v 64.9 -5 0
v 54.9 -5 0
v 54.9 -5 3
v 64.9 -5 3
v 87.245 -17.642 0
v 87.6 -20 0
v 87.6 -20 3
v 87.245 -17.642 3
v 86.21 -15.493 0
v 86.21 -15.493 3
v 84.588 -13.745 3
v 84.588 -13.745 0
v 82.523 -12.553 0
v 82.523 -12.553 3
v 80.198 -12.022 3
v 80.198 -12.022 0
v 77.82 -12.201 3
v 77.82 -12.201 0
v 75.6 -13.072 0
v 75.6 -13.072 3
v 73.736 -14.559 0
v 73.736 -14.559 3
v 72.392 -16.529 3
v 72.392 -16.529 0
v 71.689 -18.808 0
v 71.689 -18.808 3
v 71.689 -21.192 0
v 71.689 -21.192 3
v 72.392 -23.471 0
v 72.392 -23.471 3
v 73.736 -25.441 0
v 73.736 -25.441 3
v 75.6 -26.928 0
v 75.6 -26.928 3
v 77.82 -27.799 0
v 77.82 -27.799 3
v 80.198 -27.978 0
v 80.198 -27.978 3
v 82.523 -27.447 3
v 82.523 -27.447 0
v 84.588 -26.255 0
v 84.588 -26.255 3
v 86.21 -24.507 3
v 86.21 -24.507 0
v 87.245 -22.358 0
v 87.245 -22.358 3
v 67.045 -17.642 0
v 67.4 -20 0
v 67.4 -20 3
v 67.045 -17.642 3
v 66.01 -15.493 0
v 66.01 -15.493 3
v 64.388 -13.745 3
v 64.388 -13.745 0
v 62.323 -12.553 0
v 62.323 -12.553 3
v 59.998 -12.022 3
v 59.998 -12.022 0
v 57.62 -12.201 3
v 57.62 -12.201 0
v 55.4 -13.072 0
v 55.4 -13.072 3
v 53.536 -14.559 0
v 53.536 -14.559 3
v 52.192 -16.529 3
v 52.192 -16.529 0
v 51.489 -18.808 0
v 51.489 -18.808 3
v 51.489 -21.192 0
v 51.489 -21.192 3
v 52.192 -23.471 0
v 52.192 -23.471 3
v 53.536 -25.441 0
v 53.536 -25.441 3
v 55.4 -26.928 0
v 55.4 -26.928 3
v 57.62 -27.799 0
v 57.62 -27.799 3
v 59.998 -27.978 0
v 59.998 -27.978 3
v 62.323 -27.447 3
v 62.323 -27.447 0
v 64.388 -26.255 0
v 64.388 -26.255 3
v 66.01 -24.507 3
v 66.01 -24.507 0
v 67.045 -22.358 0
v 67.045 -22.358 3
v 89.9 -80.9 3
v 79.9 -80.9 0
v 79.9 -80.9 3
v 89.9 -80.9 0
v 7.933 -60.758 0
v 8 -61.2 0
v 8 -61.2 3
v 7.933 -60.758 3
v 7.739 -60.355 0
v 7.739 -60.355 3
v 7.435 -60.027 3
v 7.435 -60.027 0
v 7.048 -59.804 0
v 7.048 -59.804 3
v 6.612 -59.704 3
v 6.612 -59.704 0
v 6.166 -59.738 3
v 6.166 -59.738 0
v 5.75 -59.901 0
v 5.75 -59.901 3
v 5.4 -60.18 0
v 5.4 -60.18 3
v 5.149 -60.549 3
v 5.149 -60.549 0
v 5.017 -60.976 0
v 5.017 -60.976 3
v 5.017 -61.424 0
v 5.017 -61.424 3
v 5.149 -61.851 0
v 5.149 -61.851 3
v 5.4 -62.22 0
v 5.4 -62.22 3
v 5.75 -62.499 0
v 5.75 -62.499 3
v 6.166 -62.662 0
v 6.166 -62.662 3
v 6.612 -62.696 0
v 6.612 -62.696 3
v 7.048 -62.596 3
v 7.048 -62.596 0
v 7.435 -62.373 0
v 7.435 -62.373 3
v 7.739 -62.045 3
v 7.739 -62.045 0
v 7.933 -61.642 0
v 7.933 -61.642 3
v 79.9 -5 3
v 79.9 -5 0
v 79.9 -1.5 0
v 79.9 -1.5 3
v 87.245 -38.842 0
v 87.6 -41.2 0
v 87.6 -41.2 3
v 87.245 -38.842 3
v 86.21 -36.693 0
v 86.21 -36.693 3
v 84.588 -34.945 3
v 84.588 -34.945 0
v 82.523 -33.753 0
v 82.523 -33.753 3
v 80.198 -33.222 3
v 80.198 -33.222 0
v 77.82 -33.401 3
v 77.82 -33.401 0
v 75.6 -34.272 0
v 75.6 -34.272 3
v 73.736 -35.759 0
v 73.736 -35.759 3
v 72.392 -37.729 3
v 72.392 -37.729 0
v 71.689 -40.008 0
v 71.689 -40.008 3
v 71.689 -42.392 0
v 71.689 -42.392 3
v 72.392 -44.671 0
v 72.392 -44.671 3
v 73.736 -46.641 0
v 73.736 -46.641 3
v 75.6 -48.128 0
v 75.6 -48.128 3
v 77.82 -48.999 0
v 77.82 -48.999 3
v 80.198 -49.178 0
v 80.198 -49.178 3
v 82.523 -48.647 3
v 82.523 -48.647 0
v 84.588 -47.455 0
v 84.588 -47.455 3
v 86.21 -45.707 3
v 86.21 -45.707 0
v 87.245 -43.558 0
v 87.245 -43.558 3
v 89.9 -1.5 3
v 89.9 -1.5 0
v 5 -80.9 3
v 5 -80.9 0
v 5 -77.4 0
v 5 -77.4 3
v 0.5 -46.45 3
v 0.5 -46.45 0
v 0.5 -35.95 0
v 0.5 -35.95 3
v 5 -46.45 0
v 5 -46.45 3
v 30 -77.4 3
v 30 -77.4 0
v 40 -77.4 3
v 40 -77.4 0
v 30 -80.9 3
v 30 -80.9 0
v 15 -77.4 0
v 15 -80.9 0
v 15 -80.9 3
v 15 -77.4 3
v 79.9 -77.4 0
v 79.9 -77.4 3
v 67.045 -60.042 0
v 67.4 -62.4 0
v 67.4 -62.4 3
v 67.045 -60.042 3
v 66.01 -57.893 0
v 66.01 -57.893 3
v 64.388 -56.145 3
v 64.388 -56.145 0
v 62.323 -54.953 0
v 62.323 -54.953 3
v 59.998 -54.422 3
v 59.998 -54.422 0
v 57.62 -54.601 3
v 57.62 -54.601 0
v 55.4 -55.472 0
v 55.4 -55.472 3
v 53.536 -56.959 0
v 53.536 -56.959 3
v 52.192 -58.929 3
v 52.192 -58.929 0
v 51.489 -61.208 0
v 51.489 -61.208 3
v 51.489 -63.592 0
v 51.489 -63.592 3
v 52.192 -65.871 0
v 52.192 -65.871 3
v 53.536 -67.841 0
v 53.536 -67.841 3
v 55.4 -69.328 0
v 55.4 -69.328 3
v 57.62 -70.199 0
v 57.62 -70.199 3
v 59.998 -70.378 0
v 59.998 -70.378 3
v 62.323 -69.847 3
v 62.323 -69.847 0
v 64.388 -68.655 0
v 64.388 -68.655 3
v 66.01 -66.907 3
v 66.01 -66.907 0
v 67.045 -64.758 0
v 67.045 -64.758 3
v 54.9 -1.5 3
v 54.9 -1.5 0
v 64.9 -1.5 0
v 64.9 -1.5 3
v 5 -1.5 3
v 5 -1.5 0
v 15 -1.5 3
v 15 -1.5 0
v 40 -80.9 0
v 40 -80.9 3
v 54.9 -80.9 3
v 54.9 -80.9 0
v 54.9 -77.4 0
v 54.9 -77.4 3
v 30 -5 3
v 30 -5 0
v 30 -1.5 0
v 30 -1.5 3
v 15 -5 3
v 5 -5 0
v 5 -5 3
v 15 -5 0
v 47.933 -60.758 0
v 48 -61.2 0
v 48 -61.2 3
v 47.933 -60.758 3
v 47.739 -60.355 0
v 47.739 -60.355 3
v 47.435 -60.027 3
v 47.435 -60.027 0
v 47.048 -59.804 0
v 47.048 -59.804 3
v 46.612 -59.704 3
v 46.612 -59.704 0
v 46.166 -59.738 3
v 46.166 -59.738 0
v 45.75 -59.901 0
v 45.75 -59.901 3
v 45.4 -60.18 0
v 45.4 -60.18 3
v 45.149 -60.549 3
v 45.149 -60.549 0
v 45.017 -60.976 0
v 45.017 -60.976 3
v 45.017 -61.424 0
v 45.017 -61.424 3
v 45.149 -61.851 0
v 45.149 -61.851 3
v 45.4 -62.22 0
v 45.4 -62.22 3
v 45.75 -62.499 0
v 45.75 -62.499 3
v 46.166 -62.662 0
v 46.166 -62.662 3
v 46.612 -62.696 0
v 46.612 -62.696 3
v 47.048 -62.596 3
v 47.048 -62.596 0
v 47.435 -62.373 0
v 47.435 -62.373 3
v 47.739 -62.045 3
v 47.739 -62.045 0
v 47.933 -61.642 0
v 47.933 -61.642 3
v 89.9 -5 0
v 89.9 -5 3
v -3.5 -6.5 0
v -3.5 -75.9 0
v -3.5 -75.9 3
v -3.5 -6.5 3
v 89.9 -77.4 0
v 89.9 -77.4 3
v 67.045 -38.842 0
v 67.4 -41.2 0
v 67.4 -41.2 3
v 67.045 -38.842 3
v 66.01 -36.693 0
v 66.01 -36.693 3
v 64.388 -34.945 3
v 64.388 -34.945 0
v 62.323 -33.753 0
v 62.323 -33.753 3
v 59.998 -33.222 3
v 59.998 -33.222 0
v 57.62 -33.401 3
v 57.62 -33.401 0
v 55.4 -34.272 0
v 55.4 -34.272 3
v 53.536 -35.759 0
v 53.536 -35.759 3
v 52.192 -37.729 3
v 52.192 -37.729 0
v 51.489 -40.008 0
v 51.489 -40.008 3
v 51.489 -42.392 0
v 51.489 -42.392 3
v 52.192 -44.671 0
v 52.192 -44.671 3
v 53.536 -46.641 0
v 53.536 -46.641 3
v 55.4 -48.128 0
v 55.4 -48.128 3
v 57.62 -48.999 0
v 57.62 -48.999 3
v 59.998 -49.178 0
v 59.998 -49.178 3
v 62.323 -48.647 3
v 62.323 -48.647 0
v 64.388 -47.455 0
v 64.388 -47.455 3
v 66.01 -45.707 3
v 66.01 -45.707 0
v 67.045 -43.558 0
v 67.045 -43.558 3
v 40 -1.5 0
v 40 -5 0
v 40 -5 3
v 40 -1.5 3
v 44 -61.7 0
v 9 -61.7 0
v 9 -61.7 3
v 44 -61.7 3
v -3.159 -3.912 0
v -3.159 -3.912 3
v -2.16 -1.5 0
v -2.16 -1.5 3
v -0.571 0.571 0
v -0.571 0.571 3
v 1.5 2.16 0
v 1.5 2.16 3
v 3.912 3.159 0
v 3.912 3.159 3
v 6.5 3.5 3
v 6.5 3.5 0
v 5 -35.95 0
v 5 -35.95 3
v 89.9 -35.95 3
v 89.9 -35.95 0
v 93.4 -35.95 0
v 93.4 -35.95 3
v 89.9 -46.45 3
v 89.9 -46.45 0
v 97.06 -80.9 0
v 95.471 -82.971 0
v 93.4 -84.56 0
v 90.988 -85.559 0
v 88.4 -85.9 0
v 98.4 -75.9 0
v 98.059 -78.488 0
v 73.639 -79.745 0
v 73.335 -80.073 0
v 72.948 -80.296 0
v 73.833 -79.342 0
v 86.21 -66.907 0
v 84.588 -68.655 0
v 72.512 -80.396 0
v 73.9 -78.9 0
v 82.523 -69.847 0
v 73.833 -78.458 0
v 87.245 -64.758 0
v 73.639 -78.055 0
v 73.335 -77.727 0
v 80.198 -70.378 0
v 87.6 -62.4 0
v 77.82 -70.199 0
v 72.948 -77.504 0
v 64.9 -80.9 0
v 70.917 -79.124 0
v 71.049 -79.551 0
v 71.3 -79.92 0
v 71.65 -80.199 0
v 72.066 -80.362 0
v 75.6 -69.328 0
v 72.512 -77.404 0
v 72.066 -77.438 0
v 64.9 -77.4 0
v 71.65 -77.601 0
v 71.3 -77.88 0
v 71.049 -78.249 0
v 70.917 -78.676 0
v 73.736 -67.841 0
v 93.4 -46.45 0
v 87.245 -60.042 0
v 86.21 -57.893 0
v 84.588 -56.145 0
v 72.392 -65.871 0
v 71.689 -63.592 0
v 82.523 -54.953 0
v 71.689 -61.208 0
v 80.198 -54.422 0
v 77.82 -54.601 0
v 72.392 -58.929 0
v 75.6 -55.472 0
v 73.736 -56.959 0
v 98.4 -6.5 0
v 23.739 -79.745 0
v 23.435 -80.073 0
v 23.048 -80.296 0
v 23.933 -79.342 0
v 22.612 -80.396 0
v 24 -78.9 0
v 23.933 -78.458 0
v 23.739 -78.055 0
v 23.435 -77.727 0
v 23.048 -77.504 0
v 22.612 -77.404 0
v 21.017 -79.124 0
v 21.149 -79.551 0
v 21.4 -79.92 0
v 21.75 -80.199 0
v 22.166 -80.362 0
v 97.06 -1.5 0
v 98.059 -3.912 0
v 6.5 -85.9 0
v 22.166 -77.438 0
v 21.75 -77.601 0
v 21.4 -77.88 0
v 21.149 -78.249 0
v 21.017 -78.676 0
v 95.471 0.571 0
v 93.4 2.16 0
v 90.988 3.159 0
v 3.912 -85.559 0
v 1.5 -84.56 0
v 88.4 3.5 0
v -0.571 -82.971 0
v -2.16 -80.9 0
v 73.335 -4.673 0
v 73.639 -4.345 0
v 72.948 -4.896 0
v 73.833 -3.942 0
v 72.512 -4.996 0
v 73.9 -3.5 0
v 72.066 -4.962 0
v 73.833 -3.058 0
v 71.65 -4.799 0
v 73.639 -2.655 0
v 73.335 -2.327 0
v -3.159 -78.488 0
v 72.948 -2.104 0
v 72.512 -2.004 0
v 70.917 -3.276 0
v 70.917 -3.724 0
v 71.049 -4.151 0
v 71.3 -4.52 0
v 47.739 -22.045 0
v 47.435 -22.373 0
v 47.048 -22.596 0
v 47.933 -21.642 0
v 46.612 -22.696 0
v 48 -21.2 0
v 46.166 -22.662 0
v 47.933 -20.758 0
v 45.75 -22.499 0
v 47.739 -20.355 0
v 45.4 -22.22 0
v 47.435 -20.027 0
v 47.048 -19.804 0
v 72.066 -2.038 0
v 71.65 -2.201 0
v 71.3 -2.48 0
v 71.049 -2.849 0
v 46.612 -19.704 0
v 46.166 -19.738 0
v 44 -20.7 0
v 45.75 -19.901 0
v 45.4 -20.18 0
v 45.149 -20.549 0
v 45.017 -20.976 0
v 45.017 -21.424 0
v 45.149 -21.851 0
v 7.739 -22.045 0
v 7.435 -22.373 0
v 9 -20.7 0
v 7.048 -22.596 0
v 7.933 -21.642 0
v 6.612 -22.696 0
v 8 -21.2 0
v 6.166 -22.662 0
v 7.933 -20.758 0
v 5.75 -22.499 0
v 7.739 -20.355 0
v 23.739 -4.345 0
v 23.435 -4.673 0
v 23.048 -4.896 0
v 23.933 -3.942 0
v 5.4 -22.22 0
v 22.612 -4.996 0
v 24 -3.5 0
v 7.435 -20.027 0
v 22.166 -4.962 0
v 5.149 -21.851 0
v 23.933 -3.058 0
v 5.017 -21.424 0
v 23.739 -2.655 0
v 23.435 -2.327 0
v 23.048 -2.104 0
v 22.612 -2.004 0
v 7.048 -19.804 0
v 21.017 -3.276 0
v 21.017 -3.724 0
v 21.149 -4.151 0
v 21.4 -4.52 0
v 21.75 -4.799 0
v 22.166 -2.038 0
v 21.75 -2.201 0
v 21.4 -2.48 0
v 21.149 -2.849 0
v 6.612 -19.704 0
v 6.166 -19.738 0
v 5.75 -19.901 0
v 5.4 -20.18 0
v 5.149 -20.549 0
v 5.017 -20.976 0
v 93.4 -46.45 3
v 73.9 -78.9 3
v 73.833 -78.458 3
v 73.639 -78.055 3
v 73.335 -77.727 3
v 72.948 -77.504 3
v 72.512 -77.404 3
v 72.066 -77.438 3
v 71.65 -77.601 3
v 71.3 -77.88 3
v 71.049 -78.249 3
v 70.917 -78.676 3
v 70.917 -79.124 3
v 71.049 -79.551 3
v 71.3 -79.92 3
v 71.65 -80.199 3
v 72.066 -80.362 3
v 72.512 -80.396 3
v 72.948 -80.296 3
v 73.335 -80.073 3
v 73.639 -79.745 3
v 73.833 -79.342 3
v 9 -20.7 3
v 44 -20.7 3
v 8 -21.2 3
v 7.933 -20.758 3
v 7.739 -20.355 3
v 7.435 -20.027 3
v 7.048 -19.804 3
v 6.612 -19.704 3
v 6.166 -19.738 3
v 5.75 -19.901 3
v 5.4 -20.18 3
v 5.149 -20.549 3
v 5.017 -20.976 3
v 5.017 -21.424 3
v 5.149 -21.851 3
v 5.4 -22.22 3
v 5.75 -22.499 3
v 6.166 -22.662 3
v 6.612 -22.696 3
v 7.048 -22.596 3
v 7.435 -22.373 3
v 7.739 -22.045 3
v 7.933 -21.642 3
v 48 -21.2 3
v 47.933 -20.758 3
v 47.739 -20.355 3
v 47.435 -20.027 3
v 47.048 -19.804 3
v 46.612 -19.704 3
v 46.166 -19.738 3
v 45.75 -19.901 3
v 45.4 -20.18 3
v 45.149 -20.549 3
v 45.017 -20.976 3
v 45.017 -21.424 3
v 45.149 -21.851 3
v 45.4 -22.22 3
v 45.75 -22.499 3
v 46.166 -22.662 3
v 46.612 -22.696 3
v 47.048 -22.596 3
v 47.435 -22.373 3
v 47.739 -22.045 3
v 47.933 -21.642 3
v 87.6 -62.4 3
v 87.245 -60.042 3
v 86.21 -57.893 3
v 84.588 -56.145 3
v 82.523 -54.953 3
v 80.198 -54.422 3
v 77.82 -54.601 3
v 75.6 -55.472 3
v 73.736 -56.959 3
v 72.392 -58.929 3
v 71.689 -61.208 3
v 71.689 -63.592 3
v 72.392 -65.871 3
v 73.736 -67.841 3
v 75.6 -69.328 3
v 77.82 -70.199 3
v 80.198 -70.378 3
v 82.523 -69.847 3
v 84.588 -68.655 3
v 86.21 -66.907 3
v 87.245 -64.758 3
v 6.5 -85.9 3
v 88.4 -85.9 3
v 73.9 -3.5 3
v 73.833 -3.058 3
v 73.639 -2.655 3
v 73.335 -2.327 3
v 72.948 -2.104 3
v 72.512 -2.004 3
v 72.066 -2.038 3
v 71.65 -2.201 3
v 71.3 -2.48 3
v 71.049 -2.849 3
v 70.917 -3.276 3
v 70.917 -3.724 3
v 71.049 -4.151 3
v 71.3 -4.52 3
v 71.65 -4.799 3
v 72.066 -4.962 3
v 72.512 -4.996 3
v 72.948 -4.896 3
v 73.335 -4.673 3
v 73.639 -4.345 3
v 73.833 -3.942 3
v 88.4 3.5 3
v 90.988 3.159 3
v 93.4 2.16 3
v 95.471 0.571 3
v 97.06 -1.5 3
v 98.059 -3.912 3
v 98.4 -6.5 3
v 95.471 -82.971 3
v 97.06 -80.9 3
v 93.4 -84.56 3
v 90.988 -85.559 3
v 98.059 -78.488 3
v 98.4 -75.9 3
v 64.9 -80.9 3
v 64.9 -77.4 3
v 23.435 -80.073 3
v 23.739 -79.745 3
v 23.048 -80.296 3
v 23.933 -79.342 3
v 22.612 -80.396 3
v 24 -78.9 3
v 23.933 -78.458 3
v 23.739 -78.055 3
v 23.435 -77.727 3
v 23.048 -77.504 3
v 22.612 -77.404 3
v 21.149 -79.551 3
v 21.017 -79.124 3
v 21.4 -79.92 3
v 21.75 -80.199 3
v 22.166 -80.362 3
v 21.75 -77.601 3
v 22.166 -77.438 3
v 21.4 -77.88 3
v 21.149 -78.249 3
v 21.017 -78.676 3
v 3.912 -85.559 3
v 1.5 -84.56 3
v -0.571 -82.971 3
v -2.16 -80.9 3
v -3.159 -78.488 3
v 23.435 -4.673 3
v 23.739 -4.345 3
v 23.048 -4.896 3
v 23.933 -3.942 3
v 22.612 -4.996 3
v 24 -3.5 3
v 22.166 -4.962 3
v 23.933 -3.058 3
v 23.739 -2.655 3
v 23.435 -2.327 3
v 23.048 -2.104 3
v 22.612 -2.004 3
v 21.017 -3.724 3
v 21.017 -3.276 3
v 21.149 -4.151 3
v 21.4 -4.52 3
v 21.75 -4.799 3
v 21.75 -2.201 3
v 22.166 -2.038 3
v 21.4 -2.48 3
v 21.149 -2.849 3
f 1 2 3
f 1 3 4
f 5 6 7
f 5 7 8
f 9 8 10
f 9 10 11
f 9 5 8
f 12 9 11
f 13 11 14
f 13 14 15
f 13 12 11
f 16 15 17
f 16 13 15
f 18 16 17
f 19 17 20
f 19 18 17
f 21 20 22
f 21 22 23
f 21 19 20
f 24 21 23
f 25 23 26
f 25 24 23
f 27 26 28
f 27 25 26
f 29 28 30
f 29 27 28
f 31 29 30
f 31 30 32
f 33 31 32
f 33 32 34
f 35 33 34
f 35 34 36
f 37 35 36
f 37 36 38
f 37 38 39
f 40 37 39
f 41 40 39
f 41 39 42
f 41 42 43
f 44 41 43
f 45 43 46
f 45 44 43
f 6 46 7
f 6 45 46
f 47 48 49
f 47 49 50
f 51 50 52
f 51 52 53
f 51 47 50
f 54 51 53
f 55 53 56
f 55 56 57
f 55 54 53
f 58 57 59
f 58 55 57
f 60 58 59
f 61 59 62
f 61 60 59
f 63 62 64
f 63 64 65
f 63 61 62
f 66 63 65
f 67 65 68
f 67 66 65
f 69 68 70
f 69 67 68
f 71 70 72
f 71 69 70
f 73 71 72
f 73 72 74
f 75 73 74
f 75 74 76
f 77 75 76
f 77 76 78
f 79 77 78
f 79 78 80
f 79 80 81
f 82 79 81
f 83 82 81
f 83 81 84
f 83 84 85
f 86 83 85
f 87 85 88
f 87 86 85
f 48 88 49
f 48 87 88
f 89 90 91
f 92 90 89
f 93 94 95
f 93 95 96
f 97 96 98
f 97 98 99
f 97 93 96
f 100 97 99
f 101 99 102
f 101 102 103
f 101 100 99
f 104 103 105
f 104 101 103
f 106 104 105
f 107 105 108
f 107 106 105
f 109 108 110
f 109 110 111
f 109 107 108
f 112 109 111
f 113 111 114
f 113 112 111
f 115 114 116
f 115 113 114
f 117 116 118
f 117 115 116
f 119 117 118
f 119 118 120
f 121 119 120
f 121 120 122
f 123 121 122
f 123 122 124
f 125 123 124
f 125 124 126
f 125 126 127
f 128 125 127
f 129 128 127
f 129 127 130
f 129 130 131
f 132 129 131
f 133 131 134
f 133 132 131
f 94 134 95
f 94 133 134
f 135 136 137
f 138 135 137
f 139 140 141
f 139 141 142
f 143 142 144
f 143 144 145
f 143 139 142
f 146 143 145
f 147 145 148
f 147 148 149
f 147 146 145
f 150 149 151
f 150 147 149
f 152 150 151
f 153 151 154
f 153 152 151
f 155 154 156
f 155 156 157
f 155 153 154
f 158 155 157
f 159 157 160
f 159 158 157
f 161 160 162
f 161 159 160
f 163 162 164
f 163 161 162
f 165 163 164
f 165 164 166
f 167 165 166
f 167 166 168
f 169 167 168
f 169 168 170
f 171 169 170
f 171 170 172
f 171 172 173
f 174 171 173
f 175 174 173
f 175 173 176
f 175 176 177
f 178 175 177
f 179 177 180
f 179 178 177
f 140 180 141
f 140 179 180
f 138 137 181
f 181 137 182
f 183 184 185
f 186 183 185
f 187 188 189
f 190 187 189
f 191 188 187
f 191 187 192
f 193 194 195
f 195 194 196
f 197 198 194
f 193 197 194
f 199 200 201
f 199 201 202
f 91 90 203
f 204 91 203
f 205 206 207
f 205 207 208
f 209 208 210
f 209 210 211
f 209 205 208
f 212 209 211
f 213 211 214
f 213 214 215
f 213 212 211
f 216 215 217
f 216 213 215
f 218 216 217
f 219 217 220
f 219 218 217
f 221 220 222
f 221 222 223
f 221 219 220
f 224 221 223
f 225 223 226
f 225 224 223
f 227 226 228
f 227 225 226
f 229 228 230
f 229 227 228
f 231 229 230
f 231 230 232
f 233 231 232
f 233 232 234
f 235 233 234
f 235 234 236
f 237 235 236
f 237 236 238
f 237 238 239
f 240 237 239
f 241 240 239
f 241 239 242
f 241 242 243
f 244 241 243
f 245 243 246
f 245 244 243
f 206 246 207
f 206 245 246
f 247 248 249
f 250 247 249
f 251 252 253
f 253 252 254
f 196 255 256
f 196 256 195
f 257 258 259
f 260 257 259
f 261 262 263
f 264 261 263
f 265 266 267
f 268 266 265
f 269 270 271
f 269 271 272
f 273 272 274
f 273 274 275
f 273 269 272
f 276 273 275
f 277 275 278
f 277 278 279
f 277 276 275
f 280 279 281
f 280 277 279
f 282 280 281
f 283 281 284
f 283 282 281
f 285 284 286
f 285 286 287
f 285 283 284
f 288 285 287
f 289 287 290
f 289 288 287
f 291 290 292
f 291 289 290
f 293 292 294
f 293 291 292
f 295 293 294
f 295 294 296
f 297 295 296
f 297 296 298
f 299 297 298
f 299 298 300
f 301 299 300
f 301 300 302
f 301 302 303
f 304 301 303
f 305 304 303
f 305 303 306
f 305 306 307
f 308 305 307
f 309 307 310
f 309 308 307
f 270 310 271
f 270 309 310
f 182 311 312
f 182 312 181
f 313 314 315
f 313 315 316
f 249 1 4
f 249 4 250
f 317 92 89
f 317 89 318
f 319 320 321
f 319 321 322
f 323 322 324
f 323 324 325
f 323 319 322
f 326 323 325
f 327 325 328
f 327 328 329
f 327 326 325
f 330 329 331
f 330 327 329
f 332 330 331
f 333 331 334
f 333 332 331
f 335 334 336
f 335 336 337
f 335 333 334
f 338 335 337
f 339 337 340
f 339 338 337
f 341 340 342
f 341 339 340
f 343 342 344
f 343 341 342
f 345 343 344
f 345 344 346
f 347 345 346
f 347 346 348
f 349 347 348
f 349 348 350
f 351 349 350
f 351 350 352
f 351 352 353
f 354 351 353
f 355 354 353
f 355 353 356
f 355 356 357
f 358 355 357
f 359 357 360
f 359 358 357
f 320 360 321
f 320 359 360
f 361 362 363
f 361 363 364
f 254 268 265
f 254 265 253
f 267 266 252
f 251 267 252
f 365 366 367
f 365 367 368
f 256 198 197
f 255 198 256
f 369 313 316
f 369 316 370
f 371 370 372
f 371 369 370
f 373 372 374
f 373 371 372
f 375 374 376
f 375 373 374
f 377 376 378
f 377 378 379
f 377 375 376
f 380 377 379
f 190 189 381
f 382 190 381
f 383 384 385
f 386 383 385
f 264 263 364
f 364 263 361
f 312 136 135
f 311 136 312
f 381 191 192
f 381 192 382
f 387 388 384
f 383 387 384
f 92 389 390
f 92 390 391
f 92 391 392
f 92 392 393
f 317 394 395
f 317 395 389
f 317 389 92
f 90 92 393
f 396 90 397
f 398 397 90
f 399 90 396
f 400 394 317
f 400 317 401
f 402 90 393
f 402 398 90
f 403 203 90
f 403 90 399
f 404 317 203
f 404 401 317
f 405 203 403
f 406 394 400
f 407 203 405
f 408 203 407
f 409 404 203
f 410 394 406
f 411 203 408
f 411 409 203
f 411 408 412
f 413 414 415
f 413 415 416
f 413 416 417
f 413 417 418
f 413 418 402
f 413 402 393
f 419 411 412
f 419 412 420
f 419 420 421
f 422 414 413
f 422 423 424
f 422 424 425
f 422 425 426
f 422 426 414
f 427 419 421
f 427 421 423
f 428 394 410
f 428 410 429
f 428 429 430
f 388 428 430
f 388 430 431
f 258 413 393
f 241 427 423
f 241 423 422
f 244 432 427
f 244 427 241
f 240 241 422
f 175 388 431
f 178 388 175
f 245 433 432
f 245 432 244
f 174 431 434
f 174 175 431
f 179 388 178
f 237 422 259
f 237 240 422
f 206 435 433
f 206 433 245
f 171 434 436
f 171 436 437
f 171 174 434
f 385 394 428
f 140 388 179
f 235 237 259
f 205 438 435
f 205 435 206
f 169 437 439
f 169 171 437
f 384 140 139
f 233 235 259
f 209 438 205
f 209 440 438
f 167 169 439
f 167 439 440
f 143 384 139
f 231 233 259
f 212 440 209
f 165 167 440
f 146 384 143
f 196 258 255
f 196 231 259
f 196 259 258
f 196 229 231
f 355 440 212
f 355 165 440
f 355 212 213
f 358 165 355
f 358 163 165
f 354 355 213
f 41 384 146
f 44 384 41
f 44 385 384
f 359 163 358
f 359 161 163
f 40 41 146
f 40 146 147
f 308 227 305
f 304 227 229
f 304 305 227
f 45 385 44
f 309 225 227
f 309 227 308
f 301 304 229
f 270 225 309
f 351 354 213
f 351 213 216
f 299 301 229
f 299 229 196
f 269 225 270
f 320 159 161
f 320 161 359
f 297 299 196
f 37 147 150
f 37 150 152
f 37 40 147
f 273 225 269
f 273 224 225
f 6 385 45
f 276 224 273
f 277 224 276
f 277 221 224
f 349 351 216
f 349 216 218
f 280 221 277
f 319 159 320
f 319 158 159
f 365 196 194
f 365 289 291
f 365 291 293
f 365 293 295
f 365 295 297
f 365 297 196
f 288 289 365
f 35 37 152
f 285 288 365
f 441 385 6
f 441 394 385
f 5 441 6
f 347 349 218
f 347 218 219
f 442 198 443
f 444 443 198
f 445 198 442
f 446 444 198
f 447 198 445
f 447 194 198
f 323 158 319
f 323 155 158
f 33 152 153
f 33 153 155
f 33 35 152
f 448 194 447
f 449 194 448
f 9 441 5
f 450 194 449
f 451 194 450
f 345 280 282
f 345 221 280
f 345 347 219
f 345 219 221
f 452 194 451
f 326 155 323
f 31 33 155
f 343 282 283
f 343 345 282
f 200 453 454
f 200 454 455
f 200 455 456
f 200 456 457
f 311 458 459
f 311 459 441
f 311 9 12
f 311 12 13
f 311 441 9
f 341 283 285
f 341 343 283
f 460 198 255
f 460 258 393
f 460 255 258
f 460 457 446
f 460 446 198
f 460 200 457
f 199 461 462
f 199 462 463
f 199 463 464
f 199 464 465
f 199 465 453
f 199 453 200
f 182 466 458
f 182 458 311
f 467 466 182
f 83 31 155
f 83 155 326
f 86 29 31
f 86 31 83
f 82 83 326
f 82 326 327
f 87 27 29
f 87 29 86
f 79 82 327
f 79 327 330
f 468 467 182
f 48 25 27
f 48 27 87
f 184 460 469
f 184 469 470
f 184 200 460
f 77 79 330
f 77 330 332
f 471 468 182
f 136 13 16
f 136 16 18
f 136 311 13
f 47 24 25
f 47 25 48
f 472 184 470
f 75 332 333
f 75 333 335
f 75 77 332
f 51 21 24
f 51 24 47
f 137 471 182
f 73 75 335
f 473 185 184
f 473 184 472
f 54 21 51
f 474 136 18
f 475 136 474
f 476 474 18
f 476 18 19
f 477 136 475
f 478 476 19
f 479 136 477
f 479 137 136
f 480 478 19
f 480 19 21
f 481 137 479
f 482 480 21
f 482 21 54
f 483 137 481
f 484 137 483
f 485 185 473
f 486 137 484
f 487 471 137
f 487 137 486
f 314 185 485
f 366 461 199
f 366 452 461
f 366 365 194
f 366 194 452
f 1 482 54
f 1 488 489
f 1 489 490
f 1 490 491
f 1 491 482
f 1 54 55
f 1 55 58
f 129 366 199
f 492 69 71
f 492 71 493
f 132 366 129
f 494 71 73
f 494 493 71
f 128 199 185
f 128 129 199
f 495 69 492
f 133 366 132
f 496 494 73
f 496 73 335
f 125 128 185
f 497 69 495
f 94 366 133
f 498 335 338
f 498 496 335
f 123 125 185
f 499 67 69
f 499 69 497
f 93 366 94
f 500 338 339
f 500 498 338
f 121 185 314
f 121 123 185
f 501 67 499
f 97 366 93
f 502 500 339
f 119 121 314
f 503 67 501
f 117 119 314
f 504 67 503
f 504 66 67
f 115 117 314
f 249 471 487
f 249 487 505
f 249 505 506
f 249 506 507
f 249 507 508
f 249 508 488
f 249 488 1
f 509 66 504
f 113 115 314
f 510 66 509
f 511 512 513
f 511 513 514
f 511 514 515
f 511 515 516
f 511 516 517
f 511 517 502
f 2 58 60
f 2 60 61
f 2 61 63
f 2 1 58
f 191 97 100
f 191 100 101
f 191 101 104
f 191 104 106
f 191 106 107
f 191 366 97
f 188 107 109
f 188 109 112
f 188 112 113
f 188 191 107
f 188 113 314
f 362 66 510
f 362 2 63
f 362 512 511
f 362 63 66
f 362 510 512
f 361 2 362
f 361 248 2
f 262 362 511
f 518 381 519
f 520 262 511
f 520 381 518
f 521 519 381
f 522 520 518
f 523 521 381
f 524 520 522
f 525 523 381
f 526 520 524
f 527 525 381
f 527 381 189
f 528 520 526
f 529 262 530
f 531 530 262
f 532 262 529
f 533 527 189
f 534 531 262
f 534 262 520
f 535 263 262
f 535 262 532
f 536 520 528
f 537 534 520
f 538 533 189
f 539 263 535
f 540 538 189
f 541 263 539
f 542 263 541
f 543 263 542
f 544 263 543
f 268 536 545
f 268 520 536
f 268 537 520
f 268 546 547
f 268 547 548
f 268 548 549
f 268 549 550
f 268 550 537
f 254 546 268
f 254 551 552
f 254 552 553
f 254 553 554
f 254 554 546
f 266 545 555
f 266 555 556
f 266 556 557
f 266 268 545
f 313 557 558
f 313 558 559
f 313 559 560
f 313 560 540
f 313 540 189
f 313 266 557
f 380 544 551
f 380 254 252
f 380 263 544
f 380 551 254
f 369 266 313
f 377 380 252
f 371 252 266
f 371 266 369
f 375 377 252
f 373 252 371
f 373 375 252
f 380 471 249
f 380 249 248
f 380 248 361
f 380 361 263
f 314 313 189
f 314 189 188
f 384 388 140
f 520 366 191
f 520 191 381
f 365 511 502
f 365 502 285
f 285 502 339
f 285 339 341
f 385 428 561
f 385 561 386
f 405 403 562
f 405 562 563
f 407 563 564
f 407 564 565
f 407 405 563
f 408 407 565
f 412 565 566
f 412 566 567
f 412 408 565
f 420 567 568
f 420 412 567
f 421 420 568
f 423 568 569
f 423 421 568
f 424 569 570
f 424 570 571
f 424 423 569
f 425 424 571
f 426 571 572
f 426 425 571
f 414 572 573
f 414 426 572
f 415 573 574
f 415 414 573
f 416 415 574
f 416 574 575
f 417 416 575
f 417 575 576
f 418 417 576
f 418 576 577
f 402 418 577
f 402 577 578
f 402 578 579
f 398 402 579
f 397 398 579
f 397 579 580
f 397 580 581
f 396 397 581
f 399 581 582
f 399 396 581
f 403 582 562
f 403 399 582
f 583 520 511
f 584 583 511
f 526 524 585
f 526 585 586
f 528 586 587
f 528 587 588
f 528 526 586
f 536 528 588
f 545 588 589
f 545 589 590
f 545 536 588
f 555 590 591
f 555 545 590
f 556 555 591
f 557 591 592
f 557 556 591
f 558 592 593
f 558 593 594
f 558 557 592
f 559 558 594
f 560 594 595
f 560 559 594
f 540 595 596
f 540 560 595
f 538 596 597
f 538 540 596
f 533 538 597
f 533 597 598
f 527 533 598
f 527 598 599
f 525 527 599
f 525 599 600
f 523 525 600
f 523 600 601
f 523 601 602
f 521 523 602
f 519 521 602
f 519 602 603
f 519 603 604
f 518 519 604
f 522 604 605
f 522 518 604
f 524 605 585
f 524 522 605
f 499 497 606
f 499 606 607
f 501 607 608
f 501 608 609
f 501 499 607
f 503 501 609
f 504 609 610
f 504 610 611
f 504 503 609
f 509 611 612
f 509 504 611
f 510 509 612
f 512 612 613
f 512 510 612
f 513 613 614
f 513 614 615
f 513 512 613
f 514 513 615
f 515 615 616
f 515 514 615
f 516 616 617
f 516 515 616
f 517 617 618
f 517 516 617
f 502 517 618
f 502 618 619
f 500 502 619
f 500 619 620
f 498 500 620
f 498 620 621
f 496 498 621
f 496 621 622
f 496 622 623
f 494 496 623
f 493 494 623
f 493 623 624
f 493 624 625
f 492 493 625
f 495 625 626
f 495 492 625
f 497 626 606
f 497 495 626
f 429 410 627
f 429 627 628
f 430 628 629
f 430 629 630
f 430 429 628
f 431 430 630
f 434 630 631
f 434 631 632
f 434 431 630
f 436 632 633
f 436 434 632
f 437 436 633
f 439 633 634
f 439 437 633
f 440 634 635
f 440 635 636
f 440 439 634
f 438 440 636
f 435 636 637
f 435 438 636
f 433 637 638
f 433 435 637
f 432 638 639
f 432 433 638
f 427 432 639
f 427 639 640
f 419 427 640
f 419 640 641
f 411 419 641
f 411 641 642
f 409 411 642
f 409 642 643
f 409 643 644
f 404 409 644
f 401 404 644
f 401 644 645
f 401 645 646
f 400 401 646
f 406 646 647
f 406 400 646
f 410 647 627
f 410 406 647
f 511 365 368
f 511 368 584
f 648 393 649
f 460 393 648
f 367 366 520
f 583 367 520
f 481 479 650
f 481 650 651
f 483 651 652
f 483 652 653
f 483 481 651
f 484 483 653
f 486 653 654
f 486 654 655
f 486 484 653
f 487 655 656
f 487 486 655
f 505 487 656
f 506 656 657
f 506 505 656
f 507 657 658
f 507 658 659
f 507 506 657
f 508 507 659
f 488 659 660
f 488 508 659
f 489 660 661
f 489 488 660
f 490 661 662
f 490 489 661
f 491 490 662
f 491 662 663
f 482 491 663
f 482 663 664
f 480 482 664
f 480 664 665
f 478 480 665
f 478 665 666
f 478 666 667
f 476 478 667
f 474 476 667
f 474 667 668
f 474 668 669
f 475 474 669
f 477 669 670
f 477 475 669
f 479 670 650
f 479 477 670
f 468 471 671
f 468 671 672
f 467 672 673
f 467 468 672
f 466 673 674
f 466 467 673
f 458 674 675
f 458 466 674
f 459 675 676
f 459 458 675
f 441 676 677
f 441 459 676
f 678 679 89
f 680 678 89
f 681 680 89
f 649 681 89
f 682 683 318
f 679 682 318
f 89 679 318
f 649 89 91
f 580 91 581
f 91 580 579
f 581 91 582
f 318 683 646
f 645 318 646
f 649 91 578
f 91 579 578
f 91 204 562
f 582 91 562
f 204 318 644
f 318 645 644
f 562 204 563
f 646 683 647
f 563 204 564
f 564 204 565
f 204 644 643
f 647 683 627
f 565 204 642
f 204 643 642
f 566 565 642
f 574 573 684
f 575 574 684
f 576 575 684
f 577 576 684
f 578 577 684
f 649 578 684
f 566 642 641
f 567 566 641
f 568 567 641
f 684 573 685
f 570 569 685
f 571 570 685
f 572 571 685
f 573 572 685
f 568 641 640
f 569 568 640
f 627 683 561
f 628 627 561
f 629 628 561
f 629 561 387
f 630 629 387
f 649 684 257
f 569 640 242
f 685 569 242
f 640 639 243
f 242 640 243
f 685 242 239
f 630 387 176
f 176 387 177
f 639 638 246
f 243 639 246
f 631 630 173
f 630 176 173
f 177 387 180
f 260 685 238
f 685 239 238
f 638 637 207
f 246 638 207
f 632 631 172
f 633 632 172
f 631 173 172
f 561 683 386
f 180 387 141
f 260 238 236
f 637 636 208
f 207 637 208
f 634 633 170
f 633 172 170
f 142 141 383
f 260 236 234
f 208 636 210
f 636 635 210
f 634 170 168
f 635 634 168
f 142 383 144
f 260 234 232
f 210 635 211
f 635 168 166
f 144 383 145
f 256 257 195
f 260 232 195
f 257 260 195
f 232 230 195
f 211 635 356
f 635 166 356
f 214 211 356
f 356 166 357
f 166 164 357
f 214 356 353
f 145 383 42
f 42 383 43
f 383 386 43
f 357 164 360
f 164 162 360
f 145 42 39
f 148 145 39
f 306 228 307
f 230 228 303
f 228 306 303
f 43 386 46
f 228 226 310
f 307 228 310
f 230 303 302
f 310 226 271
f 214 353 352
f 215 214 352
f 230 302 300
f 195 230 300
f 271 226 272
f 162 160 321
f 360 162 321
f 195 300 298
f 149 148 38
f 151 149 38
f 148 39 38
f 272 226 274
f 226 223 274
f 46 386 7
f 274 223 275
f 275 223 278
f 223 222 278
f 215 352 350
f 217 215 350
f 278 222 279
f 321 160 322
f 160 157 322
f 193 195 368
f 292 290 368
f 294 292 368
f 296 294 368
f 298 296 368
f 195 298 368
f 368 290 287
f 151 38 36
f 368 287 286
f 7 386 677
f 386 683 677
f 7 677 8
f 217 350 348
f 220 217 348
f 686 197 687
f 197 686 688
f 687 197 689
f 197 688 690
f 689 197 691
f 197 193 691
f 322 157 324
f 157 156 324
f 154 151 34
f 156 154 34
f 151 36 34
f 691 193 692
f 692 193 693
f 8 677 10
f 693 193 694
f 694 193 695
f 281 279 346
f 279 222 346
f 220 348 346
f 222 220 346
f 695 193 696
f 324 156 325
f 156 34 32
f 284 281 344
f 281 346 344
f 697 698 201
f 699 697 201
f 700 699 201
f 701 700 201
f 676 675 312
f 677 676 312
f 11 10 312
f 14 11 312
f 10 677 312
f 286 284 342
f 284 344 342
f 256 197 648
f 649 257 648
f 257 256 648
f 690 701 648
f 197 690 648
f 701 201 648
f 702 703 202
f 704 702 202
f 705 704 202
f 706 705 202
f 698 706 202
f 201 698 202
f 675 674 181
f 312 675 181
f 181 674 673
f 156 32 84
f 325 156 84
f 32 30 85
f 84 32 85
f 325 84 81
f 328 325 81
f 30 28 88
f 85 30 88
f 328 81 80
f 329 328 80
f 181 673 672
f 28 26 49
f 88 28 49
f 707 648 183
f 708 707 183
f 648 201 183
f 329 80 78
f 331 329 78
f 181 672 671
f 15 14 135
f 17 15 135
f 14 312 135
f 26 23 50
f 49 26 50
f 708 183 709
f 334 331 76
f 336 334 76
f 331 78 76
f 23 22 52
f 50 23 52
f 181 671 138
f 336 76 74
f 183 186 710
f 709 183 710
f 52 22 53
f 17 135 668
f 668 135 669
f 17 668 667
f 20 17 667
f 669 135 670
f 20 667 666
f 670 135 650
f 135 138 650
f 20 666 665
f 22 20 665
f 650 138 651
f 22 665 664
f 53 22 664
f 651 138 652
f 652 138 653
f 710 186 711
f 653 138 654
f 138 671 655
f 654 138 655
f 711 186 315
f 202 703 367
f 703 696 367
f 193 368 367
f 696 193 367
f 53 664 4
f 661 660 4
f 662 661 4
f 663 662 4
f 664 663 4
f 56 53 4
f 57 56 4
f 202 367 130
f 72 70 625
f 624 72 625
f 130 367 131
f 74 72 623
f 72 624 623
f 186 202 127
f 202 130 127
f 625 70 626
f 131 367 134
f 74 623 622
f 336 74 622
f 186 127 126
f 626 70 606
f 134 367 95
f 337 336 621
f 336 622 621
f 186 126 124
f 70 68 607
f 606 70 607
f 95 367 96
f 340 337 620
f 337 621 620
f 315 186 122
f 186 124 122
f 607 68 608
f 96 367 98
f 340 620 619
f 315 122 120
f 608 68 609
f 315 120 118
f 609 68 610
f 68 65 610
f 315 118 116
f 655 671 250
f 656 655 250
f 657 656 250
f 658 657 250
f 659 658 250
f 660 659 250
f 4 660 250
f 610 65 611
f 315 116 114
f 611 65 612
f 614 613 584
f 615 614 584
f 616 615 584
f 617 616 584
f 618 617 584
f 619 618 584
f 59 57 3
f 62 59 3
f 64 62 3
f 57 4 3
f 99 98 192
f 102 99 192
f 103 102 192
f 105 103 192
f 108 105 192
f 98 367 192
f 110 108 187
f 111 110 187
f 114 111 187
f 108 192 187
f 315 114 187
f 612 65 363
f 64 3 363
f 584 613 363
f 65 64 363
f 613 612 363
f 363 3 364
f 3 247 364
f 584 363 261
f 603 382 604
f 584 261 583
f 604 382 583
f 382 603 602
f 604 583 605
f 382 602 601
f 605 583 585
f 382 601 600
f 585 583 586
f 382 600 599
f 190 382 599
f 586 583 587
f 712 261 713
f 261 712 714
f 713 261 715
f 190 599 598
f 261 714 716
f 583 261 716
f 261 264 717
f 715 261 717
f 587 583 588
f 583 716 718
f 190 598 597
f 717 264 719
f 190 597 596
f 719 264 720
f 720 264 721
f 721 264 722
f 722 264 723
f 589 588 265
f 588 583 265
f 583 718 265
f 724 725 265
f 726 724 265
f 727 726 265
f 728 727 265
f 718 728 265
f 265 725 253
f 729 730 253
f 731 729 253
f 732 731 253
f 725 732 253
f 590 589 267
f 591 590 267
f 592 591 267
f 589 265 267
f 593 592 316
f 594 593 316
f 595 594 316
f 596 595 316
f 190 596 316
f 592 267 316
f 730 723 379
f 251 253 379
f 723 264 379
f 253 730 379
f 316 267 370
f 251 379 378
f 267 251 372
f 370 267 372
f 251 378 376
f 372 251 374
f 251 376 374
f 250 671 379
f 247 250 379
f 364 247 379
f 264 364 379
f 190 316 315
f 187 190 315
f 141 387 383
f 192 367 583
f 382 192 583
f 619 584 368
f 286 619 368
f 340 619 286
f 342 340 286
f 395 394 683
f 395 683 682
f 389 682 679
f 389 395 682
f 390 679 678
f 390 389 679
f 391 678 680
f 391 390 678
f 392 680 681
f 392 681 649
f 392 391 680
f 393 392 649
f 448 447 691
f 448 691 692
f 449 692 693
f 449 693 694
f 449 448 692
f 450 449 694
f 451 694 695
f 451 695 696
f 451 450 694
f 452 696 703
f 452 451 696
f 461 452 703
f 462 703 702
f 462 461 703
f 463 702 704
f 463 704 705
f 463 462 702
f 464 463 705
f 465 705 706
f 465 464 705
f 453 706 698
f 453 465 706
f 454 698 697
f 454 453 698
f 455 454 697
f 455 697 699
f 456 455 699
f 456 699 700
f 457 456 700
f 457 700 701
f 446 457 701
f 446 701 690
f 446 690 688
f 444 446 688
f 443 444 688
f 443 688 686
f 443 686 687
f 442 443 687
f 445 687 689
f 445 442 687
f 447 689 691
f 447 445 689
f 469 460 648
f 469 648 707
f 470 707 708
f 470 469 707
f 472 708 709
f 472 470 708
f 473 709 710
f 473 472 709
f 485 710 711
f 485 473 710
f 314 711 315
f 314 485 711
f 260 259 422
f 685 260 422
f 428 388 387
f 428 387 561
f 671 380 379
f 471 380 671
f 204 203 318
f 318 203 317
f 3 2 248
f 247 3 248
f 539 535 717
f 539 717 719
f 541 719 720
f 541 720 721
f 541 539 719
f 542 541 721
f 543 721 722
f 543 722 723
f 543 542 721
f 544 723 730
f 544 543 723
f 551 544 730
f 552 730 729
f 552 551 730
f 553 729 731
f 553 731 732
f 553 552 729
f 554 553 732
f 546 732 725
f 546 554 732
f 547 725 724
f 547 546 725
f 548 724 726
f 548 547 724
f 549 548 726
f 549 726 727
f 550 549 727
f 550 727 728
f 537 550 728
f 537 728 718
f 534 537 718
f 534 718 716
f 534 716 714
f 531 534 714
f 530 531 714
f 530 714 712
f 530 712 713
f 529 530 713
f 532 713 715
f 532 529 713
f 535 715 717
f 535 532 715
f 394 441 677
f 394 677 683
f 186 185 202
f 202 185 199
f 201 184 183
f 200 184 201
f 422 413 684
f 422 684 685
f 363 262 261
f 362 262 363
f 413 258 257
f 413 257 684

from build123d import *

# Parameters (mm, degrees)
MODEL_R             = 8
MODEL_R_2           = 1.5
MODEL_W             = 10
MODEL_H             = 3.5
MODEL_W_2           = 3.5
MODEL_H_2           = 10.5
MODEL_W_3           = 4.5
MODEL_W_4           = 35
MODEL_H_3           = 41
BOSS_EXTRUDE1_DEPTH = 3


with BuildPart() as part:
    # Model → Boss-Extrude1 (new body)
    with BuildSketch(Plane.XY):
        with BuildLine():
            Line((6.5, 3.5), (88.4, 3.5))
            ThreePointArc((88.4, 3.5), (95.471067812, 0.571067812), (98.4, -6.5))
            Line((98.4, -6.5), (98.4, -75.9))
            ThreePointArc((98.4, -75.9), (95.471067812, -82.971067812), (88.4, -85.9))
            Line((88.4, -85.9), (6.5, -85.9))
            ThreePointArc((6.5, -85.9), (-0.571067812, -82.971067812), (-3.5, -75.9))
            Line((-3.5, -75.9), (-3.5, -6.5))
            ThreePointArc((-3.5, -6.5), (-0.571067812, 0.571067812), (6.5, 3.5))
        make_face()
        with Locations((79.6, -20)):
            Circle(MODEL_R, mode=Mode.SUBTRACT)
        with Locations((79.6, -62.4)):
            Circle(MODEL_R, mode=Mode.SUBTRACT)
        with Locations((79.6, -41.2)):
            Circle(MODEL_R, mode=Mode.SUBTRACT)
        with Locations((46.5, -61.2)):
            Circle(MODEL_R_2, mode=Mode.SUBTRACT)
        with Locations((6.5, -21.2)):
            Circle(MODEL_R_2, mode=Mode.SUBTRACT)
        with Locations((72.4, -78.9)):
            Circle(MODEL_R_2, mode=Mode.SUBTRACT)
        with Locations((22.5, -3.5)):
            Circle(MODEL_R_2, mode=Mode.SUBTRACT)
        with Locations((72.4, -3.5)):
            Circle(MODEL_R_2, mode=Mode.SUBTRACT)
        with Locations((22.5, -78.9)):
            Circle(MODEL_R_2, mode=Mode.SUBTRACT)
        with Locations((6.5, -61.2)):
            Circle(MODEL_R_2, mode=Mode.SUBTRACT)
        with Locations((46.5, -21.2)):
            Circle(MODEL_R_2, mode=Mode.SUBTRACT)
        with Locations((59.4, -41.2)):
            Circle(MODEL_R, mode=Mode.SUBTRACT)
        with Locations((59.4, -62.4)):
            Circle(MODEL_R, mode=Mode.SUBTRACT)
        with Locations((59.4, -20)):
            Circle(MODEL_R, mode=Mode.SUBTRACT)
        with Locations((84.9, -79.15)):
            Rectangle(MODEL_W, MODEL_H, mode=Mode.SUBTRACT)
        with Locations((35, -79.15)):
            Rectangle(MODEL_W, MODEL_H, mode=Mode.SUBTRACT)
        with Locations((84.9, -3.25)):
            Rectangle(MODEL_W, MODEL_H, mode=Mode.SUBTRACT)
        with Locations((35, -3.25)):
            Rectangle(MODEL_W, MODEL_H, mode=Mode.SUBTRACT)
        with Locations((91.65, -41.2)):
            Rectangle(MODEL_W_2, MODEL_H_2, mode=Mode.SUBTRACT)
        with Locations((2.75, -41.2)):
            Rectangle(MODEL_W_3, MODEL_H_2, mode=Mode.SUBTRACT)
        with Locations((10, -3.25)):
            Rectangle(MODEL_W, MODEL_H, mode=Mode.SUBTRACT)
        with Locations((59.9, -3.25)):
            Rectangle(MODEL_W, MODEL_H, mode=Mode.SUBTRACT)
        with Locations((10, -79.15)):
            Rectangle(MODEL_W, MODEL_H, mode=Mode.SUBTRACT)
        with Locations((59.9, -79.15)):
            Rectangle(MODEL_W, MODEL_H, mode=Mode.SUBTRACT)
        with Locations((26.5, -41.2)):
            Rectangle(MODEL_W_4, MODEL_H_3, mode=Mode.SUBTRACT)
    extrude(amount=BOSS_EXTRUDE1_DEPTH)


solid = part.part
